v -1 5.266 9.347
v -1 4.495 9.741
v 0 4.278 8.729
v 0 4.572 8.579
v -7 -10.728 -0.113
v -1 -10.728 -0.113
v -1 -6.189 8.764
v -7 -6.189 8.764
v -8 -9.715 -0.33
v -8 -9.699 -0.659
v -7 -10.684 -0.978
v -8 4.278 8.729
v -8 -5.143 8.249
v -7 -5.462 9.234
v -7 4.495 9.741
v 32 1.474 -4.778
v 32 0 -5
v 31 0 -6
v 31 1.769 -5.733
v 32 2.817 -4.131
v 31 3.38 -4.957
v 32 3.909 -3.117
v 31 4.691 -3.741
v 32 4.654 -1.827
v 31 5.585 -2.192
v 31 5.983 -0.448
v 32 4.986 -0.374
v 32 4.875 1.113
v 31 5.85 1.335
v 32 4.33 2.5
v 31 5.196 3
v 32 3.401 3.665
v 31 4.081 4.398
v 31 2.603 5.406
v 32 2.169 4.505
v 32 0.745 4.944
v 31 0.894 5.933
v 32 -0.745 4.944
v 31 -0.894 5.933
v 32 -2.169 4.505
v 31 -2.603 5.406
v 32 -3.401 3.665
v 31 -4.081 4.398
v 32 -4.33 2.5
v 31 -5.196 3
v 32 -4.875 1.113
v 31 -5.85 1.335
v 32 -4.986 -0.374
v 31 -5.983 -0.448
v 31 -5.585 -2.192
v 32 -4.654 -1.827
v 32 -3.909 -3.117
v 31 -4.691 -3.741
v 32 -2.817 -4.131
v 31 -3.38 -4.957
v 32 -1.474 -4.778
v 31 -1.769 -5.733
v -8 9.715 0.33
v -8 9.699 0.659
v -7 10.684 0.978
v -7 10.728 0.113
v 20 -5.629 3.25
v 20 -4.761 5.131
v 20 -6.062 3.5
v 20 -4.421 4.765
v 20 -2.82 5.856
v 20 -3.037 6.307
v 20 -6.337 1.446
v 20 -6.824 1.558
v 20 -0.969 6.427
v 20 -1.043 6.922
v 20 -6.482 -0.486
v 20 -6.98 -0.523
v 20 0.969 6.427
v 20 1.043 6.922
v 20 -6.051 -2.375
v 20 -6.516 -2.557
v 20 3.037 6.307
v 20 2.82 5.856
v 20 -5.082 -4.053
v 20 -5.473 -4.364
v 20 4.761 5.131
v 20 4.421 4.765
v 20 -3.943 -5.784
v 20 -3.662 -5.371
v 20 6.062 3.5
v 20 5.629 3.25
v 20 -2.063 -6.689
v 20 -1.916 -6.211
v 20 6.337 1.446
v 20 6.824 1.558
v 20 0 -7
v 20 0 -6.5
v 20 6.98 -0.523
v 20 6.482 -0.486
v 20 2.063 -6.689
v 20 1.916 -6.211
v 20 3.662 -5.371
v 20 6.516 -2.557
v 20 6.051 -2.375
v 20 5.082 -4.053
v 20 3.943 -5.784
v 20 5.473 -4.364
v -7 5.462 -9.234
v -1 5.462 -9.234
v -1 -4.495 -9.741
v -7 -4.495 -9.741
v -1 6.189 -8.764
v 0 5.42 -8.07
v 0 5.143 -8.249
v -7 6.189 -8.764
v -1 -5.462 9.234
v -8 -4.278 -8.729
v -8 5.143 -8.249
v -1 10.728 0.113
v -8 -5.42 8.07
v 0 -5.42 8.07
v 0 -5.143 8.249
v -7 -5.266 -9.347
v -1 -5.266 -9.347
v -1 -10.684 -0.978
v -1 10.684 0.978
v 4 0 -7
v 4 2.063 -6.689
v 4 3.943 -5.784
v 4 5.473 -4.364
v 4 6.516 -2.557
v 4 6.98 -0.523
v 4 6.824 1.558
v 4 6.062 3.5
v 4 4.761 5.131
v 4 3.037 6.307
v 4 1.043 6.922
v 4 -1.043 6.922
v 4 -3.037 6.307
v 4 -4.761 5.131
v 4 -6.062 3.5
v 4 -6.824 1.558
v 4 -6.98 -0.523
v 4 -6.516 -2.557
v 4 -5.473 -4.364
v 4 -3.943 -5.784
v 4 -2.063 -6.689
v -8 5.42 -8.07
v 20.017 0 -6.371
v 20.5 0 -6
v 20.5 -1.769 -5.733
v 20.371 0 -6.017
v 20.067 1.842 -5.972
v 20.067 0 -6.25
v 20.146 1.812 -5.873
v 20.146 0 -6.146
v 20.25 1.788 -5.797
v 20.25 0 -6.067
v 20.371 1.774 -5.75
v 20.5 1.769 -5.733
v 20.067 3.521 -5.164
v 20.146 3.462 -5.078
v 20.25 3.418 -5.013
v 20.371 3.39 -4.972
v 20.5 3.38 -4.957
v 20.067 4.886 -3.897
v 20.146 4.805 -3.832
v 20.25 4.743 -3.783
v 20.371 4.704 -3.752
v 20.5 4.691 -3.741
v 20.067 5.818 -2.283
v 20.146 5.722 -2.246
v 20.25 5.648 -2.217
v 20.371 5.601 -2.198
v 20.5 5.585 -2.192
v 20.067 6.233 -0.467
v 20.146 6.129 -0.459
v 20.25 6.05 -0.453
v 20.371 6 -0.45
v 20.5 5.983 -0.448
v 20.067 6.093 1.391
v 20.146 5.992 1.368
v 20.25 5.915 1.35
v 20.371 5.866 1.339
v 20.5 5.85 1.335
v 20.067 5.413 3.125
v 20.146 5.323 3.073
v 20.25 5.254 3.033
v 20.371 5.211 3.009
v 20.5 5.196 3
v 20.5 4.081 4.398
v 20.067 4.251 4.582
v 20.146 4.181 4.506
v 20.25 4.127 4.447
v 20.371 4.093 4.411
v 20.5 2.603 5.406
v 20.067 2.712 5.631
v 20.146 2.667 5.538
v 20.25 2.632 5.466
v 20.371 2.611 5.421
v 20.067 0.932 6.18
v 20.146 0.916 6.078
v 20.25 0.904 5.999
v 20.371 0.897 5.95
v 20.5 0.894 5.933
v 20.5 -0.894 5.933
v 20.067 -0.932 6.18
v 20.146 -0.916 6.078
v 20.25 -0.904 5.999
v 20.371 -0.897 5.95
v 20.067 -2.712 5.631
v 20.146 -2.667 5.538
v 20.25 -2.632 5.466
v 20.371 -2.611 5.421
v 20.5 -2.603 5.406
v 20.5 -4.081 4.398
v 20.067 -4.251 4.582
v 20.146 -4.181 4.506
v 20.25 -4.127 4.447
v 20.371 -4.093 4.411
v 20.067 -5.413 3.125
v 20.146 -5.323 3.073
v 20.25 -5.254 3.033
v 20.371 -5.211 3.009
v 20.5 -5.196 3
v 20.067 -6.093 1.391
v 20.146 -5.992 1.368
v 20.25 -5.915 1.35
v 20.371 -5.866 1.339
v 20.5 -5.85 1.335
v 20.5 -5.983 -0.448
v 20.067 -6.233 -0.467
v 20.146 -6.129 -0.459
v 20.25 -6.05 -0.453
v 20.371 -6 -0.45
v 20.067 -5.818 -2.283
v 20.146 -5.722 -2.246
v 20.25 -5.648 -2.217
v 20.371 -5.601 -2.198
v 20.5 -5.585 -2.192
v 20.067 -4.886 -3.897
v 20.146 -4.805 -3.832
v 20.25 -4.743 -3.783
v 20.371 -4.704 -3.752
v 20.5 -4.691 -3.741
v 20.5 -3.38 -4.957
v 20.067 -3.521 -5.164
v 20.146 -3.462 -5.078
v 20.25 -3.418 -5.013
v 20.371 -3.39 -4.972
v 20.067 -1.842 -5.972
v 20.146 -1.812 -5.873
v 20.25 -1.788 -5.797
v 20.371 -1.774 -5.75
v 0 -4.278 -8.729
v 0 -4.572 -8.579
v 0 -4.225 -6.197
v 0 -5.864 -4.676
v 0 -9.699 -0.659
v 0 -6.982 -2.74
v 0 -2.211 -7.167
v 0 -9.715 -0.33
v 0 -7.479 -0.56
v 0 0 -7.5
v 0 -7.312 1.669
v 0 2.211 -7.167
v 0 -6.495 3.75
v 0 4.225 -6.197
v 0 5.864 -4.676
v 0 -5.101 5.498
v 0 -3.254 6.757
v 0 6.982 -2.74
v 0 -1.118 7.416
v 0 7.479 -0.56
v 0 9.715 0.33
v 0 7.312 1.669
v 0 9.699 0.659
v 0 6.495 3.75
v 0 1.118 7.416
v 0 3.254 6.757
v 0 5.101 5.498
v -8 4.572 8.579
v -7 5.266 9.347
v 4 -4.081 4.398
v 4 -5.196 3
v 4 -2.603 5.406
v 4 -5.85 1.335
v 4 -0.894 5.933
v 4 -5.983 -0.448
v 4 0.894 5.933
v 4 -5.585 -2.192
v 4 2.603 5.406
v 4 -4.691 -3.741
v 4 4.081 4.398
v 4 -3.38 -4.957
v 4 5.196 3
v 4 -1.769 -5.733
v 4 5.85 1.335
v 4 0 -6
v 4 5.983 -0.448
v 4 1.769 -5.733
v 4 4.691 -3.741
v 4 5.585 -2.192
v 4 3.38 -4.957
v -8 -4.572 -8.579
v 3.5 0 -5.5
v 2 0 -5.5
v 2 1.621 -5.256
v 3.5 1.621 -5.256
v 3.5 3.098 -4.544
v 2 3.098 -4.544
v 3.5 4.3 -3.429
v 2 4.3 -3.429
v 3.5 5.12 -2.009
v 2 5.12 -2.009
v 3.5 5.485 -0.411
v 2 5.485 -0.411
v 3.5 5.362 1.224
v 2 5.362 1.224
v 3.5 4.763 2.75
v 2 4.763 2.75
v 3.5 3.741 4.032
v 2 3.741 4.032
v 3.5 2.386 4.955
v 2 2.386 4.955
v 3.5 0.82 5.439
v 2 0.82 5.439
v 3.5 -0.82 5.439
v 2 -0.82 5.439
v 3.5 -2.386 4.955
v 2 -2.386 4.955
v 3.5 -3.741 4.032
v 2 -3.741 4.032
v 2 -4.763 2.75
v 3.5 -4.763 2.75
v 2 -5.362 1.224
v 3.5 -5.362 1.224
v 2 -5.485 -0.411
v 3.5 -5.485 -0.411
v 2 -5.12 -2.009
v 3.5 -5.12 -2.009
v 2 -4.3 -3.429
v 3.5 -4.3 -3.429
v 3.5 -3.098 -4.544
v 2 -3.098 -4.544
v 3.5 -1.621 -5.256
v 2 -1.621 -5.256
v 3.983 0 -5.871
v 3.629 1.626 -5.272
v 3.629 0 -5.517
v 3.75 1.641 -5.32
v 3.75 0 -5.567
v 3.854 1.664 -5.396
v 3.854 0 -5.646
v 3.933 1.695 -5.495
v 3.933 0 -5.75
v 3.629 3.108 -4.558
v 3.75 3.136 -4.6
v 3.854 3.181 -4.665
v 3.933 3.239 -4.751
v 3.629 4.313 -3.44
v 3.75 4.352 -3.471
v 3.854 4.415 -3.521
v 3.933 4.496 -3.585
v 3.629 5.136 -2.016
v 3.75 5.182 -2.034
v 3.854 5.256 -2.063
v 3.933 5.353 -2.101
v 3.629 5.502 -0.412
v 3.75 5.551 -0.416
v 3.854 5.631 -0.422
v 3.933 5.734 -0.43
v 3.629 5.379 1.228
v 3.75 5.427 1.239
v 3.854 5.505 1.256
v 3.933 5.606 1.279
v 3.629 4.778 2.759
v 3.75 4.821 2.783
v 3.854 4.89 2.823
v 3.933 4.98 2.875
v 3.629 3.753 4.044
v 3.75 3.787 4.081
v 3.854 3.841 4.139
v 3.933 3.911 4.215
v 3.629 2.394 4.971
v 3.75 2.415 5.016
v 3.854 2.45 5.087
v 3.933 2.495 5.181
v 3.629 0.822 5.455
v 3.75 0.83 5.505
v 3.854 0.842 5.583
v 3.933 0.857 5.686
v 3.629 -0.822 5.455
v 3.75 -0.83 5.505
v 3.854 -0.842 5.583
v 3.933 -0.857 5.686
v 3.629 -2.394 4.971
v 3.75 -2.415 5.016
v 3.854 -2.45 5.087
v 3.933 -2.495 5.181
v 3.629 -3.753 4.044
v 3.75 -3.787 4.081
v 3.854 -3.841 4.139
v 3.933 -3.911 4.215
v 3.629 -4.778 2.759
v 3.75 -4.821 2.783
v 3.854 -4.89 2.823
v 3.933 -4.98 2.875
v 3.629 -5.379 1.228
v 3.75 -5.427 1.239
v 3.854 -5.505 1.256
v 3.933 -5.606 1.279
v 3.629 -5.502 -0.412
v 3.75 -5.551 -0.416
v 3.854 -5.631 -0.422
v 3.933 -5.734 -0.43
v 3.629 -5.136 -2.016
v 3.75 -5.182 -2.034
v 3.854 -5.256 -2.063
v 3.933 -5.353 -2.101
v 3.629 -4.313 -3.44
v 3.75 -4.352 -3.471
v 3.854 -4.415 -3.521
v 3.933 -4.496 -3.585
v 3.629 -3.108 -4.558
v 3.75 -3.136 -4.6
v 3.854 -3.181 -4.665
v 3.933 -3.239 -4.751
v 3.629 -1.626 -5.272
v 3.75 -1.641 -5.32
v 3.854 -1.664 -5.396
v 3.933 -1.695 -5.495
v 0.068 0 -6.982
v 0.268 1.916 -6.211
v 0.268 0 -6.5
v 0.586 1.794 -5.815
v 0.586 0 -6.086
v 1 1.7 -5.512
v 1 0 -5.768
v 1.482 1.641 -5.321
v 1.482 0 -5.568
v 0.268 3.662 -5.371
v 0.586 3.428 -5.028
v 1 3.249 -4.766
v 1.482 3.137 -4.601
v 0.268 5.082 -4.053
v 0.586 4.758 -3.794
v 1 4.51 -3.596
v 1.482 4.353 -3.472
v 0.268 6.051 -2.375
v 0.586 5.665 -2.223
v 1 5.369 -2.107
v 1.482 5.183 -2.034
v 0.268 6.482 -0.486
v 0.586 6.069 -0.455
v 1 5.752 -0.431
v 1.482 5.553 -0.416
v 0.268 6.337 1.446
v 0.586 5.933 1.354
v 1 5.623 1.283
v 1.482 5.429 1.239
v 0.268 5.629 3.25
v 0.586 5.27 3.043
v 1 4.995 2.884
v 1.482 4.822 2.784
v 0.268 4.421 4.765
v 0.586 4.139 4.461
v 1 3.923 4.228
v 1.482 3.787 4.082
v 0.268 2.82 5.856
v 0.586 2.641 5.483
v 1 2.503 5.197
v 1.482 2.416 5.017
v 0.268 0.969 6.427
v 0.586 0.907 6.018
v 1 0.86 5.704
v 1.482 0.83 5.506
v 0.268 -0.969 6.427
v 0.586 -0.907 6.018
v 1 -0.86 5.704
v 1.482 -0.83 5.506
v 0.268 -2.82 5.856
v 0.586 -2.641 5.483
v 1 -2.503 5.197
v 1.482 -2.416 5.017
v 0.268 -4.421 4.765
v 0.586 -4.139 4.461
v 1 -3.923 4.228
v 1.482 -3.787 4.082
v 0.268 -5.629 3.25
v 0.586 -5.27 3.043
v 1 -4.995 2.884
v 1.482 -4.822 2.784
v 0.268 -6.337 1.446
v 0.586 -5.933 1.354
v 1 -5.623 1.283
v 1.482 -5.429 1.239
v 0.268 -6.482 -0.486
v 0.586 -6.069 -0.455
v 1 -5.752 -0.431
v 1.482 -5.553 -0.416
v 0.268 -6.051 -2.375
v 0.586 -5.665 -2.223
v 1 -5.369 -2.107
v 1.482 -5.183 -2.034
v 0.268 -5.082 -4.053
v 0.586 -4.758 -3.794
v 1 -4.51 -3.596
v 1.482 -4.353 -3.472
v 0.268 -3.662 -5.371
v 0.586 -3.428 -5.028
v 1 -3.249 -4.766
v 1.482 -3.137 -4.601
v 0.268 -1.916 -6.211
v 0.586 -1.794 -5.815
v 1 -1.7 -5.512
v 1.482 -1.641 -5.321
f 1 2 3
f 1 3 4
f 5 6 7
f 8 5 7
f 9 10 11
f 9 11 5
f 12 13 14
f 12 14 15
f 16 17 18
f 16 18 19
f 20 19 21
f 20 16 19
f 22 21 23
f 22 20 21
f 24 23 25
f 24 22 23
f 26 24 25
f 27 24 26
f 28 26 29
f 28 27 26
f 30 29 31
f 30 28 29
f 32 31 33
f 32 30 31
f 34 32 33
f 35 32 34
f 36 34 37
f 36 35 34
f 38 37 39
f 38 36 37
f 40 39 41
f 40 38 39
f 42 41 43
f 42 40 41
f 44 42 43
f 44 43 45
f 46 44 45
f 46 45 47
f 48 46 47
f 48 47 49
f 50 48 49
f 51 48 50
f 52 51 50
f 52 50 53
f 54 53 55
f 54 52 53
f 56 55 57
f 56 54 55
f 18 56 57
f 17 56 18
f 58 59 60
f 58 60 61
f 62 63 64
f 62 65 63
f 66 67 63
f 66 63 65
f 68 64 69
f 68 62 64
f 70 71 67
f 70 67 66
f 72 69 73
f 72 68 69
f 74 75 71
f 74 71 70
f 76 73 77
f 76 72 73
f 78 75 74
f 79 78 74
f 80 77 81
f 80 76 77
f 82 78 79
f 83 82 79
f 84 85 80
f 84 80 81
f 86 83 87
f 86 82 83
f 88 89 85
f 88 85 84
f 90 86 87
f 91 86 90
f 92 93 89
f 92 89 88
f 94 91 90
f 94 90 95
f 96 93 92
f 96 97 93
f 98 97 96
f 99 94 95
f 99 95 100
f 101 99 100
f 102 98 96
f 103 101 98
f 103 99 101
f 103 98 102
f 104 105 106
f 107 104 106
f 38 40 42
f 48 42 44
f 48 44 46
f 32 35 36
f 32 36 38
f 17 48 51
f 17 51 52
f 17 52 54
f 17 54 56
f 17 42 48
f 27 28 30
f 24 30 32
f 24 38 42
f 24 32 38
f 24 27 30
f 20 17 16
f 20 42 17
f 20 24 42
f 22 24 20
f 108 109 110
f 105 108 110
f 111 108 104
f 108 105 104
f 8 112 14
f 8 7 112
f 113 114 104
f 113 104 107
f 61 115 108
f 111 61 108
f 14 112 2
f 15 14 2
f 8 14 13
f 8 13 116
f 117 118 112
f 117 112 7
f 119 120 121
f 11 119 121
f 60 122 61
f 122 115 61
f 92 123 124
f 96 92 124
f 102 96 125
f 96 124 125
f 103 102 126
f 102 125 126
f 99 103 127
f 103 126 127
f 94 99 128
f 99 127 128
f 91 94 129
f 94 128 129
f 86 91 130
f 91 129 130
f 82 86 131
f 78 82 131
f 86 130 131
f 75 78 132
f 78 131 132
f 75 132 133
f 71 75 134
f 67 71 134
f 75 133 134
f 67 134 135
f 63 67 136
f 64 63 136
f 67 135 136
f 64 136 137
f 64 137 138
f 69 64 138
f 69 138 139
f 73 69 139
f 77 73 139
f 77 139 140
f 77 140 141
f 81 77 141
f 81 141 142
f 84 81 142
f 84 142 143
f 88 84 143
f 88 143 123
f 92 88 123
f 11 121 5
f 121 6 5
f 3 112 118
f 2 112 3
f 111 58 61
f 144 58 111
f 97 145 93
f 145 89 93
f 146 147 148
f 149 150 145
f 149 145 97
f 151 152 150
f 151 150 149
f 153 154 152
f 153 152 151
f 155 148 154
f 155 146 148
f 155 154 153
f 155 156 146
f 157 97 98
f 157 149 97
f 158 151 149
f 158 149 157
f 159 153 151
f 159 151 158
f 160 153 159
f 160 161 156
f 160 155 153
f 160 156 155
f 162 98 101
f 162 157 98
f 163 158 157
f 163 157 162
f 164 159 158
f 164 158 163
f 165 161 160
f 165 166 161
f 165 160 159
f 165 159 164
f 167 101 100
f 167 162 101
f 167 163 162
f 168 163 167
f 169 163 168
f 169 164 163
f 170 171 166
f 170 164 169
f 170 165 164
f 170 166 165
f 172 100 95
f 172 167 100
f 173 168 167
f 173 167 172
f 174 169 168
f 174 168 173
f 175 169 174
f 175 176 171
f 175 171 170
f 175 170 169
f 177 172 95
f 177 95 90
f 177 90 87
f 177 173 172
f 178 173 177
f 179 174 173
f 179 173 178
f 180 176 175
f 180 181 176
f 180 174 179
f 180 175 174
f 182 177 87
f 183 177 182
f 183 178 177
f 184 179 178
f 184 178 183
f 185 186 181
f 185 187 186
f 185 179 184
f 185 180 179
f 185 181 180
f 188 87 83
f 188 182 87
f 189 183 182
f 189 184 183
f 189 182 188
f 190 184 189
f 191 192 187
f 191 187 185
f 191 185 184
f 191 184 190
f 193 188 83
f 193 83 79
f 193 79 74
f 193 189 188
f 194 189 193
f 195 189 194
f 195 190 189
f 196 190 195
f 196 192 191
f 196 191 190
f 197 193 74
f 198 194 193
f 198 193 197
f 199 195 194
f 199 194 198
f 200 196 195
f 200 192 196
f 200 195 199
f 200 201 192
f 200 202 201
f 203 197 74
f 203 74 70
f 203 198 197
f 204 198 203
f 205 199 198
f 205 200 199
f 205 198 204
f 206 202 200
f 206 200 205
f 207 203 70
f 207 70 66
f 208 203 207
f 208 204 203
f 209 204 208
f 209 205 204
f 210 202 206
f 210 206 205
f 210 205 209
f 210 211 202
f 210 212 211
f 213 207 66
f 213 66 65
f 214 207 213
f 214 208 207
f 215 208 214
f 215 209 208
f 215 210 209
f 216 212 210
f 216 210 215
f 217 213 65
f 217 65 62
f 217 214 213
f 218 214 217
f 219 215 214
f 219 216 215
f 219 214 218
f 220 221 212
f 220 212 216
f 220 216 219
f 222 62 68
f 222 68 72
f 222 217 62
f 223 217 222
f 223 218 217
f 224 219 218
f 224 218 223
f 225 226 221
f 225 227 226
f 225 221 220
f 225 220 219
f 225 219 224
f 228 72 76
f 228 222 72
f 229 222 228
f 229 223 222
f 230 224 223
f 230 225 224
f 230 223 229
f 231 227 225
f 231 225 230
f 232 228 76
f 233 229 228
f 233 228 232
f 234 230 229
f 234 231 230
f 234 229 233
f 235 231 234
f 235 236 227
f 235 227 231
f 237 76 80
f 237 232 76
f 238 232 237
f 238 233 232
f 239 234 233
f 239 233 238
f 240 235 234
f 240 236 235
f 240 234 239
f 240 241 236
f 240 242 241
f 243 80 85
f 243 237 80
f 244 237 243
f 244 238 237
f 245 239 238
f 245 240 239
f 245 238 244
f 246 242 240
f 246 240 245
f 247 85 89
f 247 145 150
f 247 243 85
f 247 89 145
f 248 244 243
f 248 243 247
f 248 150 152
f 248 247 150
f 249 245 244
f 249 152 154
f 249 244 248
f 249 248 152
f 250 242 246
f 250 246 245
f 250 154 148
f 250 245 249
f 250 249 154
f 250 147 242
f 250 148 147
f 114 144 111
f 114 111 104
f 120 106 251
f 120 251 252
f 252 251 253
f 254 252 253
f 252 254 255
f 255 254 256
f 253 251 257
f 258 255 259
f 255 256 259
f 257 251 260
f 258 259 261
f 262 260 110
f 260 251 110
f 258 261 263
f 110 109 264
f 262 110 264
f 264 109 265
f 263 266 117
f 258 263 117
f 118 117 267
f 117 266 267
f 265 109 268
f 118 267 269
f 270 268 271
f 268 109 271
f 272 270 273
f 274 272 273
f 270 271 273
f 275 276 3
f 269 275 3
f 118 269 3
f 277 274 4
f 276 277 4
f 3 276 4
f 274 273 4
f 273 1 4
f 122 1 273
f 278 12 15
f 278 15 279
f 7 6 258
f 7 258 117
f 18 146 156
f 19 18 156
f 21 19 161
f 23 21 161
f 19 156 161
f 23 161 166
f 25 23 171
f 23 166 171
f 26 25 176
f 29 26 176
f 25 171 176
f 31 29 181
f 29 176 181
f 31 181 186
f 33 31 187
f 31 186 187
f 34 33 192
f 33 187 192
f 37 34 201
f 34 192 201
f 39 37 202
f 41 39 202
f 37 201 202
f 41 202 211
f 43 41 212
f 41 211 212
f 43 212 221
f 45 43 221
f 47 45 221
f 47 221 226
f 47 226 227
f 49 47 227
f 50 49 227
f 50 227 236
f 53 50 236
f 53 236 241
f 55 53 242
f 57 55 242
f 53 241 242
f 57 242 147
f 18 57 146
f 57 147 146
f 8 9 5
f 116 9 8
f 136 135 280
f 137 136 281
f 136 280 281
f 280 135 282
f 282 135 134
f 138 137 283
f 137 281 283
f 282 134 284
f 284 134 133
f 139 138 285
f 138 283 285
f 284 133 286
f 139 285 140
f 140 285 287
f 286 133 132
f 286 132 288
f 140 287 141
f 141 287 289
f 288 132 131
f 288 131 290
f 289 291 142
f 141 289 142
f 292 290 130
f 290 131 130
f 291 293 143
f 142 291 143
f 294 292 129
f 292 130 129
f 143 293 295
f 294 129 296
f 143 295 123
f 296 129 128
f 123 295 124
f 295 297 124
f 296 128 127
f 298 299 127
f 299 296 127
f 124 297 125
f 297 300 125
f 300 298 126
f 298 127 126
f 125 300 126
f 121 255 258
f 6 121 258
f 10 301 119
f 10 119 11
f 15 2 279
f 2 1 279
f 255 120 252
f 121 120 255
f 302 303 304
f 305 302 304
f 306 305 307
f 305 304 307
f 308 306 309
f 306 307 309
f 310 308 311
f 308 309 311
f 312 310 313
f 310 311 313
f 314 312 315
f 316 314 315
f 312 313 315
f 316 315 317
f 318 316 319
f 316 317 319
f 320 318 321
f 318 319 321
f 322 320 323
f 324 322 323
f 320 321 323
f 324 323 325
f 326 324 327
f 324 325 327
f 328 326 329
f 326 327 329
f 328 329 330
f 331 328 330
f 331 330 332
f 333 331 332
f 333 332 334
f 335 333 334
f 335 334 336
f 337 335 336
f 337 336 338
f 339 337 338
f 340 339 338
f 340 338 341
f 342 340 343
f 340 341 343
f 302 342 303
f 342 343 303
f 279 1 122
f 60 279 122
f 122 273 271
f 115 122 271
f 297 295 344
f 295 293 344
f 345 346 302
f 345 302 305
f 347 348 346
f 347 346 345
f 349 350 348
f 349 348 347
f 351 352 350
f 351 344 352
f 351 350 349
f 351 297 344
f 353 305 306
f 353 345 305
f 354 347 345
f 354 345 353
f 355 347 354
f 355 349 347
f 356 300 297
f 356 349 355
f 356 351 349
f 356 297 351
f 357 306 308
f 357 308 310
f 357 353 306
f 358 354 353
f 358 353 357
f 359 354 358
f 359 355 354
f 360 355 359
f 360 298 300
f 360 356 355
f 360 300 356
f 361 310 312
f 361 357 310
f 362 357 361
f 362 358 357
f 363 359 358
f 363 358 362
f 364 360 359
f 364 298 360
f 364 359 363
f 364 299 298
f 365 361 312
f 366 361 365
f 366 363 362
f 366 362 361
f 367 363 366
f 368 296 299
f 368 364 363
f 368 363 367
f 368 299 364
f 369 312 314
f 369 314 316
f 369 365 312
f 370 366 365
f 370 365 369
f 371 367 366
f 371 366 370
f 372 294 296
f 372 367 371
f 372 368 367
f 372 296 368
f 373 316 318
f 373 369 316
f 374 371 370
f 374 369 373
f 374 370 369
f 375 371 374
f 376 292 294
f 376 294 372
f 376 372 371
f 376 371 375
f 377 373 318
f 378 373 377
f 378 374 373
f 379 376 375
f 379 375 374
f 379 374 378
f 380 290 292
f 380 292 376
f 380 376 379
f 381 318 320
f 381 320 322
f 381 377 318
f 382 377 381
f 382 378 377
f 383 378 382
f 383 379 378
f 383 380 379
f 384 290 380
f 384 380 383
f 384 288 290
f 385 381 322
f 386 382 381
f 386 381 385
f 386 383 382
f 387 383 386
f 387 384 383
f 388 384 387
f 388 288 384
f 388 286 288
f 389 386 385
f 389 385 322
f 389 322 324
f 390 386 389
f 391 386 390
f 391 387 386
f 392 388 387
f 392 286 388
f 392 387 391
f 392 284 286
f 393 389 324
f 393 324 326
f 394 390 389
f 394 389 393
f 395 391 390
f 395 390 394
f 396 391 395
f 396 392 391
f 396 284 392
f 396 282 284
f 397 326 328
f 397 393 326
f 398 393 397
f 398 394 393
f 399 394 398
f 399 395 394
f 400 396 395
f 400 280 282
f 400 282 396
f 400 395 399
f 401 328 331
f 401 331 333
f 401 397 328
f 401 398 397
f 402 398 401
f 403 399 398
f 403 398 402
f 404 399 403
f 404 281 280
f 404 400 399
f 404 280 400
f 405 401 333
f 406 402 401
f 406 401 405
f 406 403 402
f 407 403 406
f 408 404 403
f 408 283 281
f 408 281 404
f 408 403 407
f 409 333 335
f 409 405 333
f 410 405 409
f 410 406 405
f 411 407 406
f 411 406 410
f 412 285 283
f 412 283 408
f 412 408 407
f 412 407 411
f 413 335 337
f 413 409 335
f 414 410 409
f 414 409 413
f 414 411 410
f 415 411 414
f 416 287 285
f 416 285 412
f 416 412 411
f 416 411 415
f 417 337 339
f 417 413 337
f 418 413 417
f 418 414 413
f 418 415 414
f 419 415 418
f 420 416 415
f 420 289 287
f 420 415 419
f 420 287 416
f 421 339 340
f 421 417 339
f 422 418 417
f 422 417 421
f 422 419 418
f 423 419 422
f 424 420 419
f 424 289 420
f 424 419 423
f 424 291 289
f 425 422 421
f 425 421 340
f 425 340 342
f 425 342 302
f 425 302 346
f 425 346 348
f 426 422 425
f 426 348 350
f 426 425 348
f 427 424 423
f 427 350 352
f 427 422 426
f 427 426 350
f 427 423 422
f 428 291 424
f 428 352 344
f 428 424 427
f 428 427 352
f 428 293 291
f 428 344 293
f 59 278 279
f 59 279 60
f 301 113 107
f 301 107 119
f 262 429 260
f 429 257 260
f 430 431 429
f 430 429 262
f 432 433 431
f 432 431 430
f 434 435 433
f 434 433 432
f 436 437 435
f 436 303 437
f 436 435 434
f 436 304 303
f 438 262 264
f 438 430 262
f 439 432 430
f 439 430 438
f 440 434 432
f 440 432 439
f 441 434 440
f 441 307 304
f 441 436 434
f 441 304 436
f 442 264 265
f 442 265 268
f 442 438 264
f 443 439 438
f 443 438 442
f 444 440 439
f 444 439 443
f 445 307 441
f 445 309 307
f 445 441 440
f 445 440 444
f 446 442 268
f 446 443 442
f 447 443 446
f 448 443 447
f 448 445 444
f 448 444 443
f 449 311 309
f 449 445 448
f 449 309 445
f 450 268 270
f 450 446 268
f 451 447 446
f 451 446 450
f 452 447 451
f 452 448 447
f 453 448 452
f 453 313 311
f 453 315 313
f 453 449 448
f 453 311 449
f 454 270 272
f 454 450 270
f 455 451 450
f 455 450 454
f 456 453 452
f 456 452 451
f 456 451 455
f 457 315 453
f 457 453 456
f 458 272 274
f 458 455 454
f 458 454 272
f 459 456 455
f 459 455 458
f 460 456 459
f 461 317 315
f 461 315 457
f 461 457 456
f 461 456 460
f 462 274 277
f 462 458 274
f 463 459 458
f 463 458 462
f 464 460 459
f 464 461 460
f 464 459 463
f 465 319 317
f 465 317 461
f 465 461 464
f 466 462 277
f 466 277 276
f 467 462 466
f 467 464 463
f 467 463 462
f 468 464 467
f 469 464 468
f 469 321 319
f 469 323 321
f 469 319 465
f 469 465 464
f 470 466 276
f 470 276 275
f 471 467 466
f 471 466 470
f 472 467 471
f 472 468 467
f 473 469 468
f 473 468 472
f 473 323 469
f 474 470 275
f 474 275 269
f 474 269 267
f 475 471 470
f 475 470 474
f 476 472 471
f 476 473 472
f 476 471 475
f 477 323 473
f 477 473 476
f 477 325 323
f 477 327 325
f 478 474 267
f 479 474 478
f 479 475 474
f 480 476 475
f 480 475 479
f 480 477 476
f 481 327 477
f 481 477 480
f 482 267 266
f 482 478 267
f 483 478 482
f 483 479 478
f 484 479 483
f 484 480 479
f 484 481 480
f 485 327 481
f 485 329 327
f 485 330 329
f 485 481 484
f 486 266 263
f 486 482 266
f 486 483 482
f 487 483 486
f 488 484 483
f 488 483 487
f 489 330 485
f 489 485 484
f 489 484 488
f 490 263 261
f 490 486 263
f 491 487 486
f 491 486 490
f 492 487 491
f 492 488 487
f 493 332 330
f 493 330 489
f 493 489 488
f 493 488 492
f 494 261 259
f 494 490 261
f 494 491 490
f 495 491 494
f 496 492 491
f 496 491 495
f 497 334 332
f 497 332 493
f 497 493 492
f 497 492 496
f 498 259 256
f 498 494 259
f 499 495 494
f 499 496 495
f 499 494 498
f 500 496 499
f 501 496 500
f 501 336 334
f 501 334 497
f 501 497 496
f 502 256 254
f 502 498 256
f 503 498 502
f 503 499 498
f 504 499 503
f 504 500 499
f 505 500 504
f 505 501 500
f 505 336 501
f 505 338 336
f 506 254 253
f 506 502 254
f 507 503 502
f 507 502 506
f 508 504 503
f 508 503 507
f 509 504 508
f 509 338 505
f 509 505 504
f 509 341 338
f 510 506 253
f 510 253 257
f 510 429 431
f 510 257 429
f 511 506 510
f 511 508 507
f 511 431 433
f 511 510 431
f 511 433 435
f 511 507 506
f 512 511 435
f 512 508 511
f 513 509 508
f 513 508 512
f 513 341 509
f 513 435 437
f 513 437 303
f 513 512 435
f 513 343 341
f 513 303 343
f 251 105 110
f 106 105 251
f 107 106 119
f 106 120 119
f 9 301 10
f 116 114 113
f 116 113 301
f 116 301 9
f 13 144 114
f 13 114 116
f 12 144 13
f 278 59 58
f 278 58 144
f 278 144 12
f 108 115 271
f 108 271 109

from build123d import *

# Parameters (mm, degrees)
SCHIZZO1_R          = 7
ESTRUSIONE1_DEPTH   = 20
SCHIZZO2_R          = 6
ESTRUSIONE2_DEPTH   = 12
ESTRUSIONE3_DEPTH   = 8
SCHIZZO4_OUTSIDE_W  = 31.456
SCHIZZO4_OUTSIDE_H  = 33.832
SCHIZZO4_OUTSIDE_R  = 5.5
ESTRUSIONE4_DEPTH   = 4
SMUSSO1_SIZE        = 0.5
SMUSSO1_EDGE_2_SIZE = 0.5
SMUSSO1_EDGE_3_SIZE = 0.5
SMUSSO1_EDGE_4_SIZE = 0.5
SMUSSO1_EDGE_5_SIZE = 0.5
SMUSSO1_EDGE_6_SIZE = 0.5
SMUSSO2_SIZE        = 1
RACCORDO1_R         = 2
RACCORDO2_R         = 0.5
SMUSSO3_SIZE        = 1


with BuildPart() as part:
    # Schizzo1 → Estrusione1 (new body)
    with BuildSketch(Plane(origin=(0, 0, 0), x_dir=(0, 0, -1), z_dir=(1, 0, 0))):
        Circle(SCHIZZO1_R)
    extrude(amount=ESTRUSIONE1_DEPTH)

    # Schizzo2 → Estrusione2 (add)
    with BuildSketch(Plane(origin=(20, 0, 0), x_dir=(0, 0, -1), z_dir=(1, 0, 0))):
        Circle(SCHIZZO2_R)
    extrude(amount=ESTRUSIONE2_DEPTH)

    # Schizzo3 → Estrusione3 (add)
    with BuildSketch(Plane.ZY):
        Polygon((9.208732283, -5.960921327), (9.766675441, 4.99453543), (0.557943158, 10.955456758), (-9.208732283, 5.960921327), (-9.766675441, -4.99453543), (-0.557943158, -10.955456758), align=None)
    extrude(amount=ESTRUSIONE3_DEPTH)

    # Schizzo4 outside → Estrusione4 (cut)
    with BuildSketch(Plane(origin=(0, 0, 0), x_dir=(0, 0, -1), z_dir=(1, 0, 0))):
        Rectangle(SCHIZZO4_OUTSIDE_W, SCHIZZO4_OUTSIDE_H)
        Circle(SCHIZZO4_OUTSIDE_R, mode=Mode.SUBTRACT)
    extrude(amount=ESTRUSIONE4_DEPTH, mode=Mode.SUBTRACT)

    # Smusso1
    smusso1_edges = [part.edges().sort_by_distance(p)[0] for p in [
        (-4, -5.960921327, 9.208732283),
    ]]
    chamfer(smusso1_edges, length=SMUSSO1_SIZE)

    # Smusso1 edge 2
    smusso1_edge_2_edges = [part.edges().sort_by_distance(p)[0] for p in [
        (-4, 4.99453543, 9.766675441),
    ]]
    chamfer(smusso1_edge_2_edges, length=SMUSSO1_EDGE_2_SIZE)

    # Smusso1 edge 3
    smusso1_edge_3_edges = [part.edges().sort_by_distance(p)[0] for p in [
        (-4, 10.955456758, 0.557943158),
    ]]
    chamfer(smusso1_edge_3_edges, length=SMUSSO1_EDGE_3_SIZE)

    # Smusso1 edge 4
    smusso1_edge_4_edges = [part.edges().sort_by_distance(p)[0] for p in [
        (-4, 5.960921327, -9.208732283),
    ]]
    chamfer(smusso1_edge_4_edges, length=SMUSSO1_EDGE_4_SIZE)

    # Smusso1 edge 5
    smusso1_edge_5_edges = [part.edges().sort_by_distance(p)[0] for p in [
        (-4, -4.99453543, -9.766675441),
    ]]
    chamfer(smusso1_edge_5_edges, length=SMUSSO1_EDGE_5_SIZE)

    # Smusso1 edge 6
    smusso1_edge_6_edges = [part.edges().sort_by_distance(p)[0] for p in [
        (-4, -10.955456758, -0.557943158),
    ]]
    chamfer(smusso1_edge_6_edges, length=SMUSSO1_EDGE_6_SIZE)

    # Smusso2
    smusso2_edges = [part.edges().sort_by_distance(p)[0] for p in [
        (0, -8.458189042, 4.325394563),
        (-8, -8.458189042, 4.325394563),
        (0, -7.974996094, -5.162309299),
        (0, 0.483192949, -9.487703862),
        (0, 8.458189042, -4.325394563),
        (0, 7.974996094, 5.162309299),
        (0, -0.483192949, 9.487703862),
        (0, 4.880709257, 9.544091519),
        (0, -5.825071083, 8.998863965),
        (0, 10.70578034, 0.545227554),
        (0, 5.825071083, -8.998863965),
        (0, -4.880709257, -9.544091519),
        (0, -10.70578034, -0.545227554),
        (-8, -7.974996094, -5.162309299),
        (-8, -0.483192949, 9.487703862),
        (-8, 7.974996094, 5.162309299),
        (-8, 8.458189042, -4.325394563),
        (-8, 0.483192949, -9.487703862),
        (-8, 4.880709257, 9.544091519),
        (-8, -5.825071083, 8.998863965),
        (-8, 10.70578034, 0.545227554),
        (-8, 5.825071083, -8.998863965),
        (-8, -4.880709257, -9.544091519),
        (-8, -10.70578034, -0.545227554),
    ]]
    chamfer(smusso2_edges, length=SMUSSO2_SIZE)

    # Raccordo1
    raccordo1_edges = [part.edges().sort_by_distance(p)[0] for p in [
        (0, 0, 5.5),
    ]]
    fillet(raccordo1_edges, radius=RACCORDO1_R)

    # Raccordo2
    raccordo2_edges = [part.edges().sort_by_distance(p)[0] for p in [
        (4, 0, 5.5),
        (20, 0, 6),
    ]]
    fillet(raccordo2_edges, radius=RACCORDO2_R)

    # Smusso3
    smusso3_edges = [part.edges().sort_by_distance(p)[0] for p in [
        (32, 0, 6),
    ]]
    chamfer(smusso3_edges, length=SMUSSO3_SIZE)


solid = part.part
